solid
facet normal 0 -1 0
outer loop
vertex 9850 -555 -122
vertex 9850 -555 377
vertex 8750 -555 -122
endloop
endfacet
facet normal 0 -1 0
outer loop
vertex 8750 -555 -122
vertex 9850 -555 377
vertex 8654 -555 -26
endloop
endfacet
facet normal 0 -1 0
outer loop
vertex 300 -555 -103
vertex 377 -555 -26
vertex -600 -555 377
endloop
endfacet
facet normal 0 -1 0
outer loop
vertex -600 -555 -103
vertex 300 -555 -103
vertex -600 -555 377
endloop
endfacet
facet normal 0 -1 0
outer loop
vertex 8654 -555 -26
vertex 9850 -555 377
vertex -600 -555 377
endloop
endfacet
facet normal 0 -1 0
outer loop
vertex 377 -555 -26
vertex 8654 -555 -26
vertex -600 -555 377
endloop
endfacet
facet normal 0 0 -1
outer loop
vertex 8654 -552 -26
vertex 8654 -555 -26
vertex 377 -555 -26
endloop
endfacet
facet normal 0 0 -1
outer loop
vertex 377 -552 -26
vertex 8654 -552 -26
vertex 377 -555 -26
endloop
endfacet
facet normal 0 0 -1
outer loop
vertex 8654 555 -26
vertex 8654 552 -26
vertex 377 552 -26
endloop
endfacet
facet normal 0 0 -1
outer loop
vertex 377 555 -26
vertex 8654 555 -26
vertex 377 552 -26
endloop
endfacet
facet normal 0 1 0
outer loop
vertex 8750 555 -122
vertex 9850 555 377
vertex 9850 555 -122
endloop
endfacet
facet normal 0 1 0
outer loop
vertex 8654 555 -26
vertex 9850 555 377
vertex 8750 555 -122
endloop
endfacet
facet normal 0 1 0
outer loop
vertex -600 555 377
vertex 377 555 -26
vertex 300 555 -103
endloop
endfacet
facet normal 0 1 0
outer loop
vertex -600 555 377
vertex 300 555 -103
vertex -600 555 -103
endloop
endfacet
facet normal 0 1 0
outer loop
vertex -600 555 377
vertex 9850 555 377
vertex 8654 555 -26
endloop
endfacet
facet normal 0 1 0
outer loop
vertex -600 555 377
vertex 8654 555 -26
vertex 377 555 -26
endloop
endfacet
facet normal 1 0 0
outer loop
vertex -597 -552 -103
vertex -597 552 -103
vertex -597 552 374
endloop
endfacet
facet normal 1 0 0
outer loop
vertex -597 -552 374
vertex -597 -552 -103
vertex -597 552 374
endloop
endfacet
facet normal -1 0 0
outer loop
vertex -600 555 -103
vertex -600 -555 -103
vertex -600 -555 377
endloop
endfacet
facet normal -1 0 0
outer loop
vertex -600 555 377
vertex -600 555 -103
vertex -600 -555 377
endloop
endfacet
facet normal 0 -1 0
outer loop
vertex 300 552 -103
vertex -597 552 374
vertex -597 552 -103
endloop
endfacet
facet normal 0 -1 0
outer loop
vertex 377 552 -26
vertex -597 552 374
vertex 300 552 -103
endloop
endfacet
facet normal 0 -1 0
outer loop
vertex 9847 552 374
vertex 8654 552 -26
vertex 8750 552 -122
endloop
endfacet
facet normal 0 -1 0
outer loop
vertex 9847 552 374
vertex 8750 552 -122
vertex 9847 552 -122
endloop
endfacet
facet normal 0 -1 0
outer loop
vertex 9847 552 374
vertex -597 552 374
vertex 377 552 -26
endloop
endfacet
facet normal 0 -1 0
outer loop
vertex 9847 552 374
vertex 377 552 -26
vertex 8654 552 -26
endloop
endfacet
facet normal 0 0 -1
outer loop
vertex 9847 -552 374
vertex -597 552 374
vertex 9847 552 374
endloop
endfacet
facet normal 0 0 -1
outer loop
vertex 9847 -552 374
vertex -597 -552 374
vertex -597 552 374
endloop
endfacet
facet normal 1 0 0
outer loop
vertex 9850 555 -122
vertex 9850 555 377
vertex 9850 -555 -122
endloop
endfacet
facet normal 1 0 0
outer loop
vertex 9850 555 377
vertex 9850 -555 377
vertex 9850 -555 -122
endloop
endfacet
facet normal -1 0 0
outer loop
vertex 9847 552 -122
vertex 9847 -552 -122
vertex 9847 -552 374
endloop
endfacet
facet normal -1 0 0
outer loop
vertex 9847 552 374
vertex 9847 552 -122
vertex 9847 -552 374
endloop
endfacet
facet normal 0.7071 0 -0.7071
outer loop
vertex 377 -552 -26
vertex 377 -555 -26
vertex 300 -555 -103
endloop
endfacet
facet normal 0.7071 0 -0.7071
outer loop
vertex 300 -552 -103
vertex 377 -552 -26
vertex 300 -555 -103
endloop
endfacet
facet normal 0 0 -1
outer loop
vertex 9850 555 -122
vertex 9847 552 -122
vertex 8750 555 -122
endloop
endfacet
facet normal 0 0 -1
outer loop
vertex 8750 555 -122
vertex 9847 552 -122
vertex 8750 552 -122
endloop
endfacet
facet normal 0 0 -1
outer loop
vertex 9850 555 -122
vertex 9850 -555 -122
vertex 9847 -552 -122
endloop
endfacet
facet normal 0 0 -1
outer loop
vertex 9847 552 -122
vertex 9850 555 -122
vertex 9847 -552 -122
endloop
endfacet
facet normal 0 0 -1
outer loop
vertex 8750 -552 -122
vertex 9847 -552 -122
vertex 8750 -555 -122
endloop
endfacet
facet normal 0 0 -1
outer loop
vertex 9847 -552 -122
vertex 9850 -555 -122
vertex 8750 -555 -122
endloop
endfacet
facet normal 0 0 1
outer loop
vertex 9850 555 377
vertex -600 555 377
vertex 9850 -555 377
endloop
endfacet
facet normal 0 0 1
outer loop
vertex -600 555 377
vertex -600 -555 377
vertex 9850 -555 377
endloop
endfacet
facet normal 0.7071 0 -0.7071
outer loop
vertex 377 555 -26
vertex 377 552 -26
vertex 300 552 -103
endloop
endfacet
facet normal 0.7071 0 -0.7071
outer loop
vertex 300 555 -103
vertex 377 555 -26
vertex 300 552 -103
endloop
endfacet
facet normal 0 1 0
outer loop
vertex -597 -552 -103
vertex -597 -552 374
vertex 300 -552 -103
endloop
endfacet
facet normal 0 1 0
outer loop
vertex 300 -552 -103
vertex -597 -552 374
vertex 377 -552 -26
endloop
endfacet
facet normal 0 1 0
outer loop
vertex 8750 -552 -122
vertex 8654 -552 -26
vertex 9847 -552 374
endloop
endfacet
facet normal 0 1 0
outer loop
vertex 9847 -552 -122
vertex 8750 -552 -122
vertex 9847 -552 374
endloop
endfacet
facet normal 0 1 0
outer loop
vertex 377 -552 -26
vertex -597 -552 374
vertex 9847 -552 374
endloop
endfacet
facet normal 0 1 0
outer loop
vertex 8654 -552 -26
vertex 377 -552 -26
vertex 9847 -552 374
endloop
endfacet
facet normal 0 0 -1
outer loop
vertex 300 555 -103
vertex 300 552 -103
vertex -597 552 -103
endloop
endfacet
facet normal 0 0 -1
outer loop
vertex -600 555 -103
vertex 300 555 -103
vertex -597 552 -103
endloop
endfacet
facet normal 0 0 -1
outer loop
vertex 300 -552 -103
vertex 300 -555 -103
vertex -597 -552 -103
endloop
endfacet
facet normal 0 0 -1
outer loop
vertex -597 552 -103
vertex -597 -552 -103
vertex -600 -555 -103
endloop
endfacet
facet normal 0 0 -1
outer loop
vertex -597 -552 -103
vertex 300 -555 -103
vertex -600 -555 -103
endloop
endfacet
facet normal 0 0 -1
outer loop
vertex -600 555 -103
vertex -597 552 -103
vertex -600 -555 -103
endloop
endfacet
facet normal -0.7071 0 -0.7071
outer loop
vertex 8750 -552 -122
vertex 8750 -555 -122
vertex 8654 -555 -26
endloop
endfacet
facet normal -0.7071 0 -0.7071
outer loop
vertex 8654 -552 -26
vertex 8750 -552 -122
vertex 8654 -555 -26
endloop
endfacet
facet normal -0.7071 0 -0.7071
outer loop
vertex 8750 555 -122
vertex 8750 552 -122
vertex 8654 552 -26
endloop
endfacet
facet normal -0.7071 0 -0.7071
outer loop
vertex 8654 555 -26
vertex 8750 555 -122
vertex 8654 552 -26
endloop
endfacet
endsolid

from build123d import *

# Parameters (mm, degrees)
SKETCH034_W      = 10444
SKETCH034_H      = 580
EXTRUDE033_DEPTH = 552
EXTRUDE012_DEPTH = 555


with BuildPart() as extrude033:
    # Sketch034 → Extrude033 (new body, symmetric)
    with BuildSketch(Plane.XZ):
        with Locations((4625, 84)):
            Rectangle(SKETCH034_W, SKETCH034_H)
    extrude(amount=EXTRUDE033_DEPTH, both=True)


with BuildPart() as cut:
    # Sketch020 → Extrude012 (new body, symmetric)
    with BuildSketch(Plane.XZ):
        Polygon((-600, -103), (-600, 377), (9850, 377), (9850, -122), (8750, -122), (8654, -26), (377, -26), (300, -103), align=None)
    extrude(amount=EXTRUDE012_DEPTH, both=True)

    # Cut: cut Extrude033
    add(extrude033.part, mode=Mode.SUBTRACT)


solid = cut.part
